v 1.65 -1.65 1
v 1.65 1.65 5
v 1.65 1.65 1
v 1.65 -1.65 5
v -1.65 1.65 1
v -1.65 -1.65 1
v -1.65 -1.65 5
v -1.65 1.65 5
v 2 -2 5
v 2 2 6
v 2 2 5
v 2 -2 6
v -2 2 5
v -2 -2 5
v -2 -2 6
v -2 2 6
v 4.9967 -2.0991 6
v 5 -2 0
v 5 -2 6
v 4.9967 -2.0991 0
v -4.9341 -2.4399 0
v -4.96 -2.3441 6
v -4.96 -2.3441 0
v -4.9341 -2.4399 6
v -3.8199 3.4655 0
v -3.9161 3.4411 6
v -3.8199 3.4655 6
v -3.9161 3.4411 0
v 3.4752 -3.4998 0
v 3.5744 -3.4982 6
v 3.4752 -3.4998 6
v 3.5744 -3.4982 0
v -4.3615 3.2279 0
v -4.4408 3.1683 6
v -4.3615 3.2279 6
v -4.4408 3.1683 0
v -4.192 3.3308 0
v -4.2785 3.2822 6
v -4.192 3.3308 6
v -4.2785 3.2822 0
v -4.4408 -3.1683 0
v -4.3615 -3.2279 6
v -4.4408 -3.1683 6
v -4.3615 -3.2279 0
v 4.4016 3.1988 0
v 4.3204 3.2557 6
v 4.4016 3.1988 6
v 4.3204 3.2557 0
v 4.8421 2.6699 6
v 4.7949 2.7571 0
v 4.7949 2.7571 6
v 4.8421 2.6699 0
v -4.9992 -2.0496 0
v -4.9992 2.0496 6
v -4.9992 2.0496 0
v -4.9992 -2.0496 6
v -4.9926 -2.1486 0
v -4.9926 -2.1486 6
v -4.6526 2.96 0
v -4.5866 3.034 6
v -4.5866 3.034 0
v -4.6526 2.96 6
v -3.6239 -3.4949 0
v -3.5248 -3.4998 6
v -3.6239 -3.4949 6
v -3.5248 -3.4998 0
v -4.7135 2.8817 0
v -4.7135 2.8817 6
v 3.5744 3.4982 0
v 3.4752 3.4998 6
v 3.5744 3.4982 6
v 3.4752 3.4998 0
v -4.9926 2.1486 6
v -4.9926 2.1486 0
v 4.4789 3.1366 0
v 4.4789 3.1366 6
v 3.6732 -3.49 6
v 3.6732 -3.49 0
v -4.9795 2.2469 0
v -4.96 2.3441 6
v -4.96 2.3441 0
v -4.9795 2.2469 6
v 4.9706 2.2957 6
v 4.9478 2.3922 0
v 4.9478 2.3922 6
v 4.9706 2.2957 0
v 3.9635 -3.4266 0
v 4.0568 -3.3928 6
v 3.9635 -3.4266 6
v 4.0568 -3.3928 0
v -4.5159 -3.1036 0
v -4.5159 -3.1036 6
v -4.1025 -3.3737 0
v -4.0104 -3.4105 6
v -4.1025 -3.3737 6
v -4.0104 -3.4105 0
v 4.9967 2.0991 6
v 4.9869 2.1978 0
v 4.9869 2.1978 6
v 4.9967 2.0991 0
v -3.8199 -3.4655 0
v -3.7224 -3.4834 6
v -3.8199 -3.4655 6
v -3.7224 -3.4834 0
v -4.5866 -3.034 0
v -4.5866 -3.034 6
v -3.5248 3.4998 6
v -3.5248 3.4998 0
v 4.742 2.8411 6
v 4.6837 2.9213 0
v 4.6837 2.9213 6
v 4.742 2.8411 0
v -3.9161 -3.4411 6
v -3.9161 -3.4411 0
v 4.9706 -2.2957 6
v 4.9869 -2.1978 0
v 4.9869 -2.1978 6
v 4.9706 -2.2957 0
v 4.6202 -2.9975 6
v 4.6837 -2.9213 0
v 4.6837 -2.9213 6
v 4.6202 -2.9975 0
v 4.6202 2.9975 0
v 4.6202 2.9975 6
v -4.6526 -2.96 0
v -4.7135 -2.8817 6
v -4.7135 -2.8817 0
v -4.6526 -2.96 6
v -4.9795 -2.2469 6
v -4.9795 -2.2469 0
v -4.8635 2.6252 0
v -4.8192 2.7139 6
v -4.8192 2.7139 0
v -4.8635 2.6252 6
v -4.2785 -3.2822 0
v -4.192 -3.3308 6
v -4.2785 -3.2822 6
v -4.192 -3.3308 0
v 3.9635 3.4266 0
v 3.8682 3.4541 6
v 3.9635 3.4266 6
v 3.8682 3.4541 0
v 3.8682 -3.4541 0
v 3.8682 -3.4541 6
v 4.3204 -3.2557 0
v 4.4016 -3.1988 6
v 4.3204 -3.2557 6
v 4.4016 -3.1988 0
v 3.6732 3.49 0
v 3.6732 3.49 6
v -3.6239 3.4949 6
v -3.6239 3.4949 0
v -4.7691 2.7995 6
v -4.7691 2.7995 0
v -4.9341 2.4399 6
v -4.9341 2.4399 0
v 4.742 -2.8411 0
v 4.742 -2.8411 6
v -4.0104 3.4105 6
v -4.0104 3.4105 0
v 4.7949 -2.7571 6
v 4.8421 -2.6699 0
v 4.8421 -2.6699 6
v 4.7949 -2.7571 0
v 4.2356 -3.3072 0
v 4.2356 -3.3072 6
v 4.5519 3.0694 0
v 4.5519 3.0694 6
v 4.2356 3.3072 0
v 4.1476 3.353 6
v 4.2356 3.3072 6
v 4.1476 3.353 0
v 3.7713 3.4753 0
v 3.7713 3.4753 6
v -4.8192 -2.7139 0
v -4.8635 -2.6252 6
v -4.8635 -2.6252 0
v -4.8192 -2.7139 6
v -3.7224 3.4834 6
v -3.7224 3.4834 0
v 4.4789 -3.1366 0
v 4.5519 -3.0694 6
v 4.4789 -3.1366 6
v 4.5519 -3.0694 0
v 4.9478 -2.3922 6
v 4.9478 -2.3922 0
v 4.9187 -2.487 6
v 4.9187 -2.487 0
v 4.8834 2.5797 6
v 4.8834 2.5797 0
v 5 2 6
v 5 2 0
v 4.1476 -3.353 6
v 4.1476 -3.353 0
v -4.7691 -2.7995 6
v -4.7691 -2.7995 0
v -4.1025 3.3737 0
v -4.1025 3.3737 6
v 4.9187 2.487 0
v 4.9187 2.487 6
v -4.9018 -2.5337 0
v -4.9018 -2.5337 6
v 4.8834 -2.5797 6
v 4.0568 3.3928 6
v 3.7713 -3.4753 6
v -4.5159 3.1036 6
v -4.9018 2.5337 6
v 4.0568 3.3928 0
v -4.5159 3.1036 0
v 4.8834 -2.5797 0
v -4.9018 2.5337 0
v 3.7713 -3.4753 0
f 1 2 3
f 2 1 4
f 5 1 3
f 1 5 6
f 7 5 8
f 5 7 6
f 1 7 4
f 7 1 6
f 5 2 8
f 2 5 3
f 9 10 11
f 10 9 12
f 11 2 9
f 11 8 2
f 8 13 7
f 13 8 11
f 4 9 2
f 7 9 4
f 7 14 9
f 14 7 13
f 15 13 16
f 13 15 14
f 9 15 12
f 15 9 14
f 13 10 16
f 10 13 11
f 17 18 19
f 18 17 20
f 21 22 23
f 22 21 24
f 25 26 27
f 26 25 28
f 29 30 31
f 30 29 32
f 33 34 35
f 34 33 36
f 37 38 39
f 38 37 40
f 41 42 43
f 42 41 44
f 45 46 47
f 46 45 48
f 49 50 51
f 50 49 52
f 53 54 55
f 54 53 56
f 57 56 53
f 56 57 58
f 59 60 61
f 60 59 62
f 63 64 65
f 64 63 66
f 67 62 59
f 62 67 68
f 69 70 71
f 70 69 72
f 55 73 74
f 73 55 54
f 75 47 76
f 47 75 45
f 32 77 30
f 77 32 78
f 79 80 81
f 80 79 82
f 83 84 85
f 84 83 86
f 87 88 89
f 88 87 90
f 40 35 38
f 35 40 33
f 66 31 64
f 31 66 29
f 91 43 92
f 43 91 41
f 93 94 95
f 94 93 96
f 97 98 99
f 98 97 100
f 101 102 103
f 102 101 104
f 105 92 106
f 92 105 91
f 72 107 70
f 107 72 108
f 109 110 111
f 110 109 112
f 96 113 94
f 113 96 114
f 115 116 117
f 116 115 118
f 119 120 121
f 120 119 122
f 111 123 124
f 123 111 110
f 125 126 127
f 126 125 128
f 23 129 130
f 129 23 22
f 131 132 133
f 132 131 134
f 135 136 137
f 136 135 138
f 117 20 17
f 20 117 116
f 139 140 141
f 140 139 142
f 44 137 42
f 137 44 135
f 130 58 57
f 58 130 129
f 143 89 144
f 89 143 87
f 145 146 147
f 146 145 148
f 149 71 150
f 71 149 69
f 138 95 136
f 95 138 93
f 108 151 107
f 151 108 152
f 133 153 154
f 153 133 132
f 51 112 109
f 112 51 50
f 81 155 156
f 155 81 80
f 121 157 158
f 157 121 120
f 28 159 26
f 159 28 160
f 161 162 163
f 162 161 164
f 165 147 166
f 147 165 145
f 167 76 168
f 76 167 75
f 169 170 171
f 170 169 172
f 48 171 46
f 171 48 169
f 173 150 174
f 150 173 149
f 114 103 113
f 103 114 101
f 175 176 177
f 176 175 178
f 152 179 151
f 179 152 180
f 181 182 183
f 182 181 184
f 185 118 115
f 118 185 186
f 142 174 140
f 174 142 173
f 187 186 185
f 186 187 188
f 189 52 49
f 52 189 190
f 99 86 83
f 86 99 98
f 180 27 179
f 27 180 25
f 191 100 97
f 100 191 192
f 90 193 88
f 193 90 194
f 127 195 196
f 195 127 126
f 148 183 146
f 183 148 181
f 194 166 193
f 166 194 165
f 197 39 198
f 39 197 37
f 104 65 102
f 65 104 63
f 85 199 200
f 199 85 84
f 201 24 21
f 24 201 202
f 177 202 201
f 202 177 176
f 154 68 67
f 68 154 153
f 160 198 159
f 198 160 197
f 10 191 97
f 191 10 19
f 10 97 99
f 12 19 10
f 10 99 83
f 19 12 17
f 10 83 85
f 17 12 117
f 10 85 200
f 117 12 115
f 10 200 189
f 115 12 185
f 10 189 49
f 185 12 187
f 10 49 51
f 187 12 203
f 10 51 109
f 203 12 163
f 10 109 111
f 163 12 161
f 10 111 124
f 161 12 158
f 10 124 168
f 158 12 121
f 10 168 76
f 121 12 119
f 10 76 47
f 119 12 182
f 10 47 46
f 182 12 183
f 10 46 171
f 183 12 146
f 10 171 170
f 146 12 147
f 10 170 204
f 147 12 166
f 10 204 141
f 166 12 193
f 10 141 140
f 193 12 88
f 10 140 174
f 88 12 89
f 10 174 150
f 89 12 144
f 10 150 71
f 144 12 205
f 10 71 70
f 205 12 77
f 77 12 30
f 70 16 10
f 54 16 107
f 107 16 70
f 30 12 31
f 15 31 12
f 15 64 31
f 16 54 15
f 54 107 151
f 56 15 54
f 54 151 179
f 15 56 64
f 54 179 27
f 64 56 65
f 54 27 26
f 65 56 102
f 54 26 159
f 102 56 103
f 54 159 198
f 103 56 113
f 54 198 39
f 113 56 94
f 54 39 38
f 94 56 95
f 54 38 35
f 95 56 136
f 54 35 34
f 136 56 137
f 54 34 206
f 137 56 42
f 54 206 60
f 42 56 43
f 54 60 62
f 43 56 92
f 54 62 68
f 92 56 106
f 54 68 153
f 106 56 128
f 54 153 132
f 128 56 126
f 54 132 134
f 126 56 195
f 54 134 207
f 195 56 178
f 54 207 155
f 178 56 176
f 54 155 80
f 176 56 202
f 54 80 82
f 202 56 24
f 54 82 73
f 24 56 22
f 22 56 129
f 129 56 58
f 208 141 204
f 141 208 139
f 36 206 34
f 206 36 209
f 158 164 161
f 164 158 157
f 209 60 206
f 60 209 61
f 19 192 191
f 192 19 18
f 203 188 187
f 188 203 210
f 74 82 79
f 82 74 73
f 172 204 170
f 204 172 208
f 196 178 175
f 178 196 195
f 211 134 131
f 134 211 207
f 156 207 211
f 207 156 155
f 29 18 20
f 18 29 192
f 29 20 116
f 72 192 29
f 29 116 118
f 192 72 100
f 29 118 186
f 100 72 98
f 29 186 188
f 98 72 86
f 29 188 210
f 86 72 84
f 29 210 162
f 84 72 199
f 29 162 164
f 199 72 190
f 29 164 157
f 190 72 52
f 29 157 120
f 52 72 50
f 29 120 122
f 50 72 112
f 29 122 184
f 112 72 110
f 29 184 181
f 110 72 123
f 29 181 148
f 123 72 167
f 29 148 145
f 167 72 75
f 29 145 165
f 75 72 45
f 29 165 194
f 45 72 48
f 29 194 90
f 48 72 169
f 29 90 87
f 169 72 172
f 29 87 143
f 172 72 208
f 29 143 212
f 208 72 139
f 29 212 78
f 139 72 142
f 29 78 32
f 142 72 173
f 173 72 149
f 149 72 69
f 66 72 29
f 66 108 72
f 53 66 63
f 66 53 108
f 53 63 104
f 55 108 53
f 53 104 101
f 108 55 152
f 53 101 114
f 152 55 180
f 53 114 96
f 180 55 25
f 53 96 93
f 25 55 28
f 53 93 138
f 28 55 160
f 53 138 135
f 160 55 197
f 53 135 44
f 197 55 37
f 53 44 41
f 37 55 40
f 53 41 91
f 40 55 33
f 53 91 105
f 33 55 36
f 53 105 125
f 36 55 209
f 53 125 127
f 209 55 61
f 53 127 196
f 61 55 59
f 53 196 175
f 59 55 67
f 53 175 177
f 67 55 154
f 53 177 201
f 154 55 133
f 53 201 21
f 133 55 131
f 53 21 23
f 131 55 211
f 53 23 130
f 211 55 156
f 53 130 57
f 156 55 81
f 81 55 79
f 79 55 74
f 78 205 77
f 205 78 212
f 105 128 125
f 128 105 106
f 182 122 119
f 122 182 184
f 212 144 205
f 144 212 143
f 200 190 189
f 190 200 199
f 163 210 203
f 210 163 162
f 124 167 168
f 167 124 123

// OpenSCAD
$fs = 0.1;
$fa = 1;

// ----------------------------------------
// cap

dx = 10;
dy = 7;
dz = 6;
wstem = 3.3;
hstem = 4;
sp = 4;
eps = 0.001;
trim = 0.0;

module cap()
{
    r = 1.5;
    w1 = 3.3+trim;
    d1 = 5;
    w2 = 4+trim;
    d2 = 1;
    difference()
    {
        translate([-dx/2+r, -dy/2+r, 0])
        {
            minkowski()
            {
                cube([dx-r*2, dy-r*2, dz-eps]);
                cylinder(r=r, h=eps);
            }
        }
        union()
        {
            // stem1
            translate([-w1/2, -w1/2, 0])
                cube([w1, w1, d1]);
            // stem2
            translate([-w2/2, -w2/2, 0])
                cube([w2, w2, d2]);
            // hole cutter
            translate([-w2/2, -w2/2, -eps])
                cube([w2, w2, eps*2]);
        }
    }
}

// ----------------------------------------
// output

printmulti = false;
printsingle = true;
xsect = false;

if(printmulti)
{
    for(x = [-0.5, 0.5])
    {
        for(y = [-0.5, 0.5])
        {
            translate([x * (dx + sp), y * (dy + sp)])
                rotate(a=180, v=[1, 0, 0])
                    translate([0, 0, -dz])
                        cap();
        }
    }
}
else if(printsingle)
{
    rotate(a=180, v=[1, 0, 0])
        translate([0, 0, -dz])
            cap();
}
else if(xsect)
{
    difference()
    {
        cap();
        translate([0, -10, 0])
            cube([20, 20, 20], center=true);
    }
}
else
{
    cap();
}
